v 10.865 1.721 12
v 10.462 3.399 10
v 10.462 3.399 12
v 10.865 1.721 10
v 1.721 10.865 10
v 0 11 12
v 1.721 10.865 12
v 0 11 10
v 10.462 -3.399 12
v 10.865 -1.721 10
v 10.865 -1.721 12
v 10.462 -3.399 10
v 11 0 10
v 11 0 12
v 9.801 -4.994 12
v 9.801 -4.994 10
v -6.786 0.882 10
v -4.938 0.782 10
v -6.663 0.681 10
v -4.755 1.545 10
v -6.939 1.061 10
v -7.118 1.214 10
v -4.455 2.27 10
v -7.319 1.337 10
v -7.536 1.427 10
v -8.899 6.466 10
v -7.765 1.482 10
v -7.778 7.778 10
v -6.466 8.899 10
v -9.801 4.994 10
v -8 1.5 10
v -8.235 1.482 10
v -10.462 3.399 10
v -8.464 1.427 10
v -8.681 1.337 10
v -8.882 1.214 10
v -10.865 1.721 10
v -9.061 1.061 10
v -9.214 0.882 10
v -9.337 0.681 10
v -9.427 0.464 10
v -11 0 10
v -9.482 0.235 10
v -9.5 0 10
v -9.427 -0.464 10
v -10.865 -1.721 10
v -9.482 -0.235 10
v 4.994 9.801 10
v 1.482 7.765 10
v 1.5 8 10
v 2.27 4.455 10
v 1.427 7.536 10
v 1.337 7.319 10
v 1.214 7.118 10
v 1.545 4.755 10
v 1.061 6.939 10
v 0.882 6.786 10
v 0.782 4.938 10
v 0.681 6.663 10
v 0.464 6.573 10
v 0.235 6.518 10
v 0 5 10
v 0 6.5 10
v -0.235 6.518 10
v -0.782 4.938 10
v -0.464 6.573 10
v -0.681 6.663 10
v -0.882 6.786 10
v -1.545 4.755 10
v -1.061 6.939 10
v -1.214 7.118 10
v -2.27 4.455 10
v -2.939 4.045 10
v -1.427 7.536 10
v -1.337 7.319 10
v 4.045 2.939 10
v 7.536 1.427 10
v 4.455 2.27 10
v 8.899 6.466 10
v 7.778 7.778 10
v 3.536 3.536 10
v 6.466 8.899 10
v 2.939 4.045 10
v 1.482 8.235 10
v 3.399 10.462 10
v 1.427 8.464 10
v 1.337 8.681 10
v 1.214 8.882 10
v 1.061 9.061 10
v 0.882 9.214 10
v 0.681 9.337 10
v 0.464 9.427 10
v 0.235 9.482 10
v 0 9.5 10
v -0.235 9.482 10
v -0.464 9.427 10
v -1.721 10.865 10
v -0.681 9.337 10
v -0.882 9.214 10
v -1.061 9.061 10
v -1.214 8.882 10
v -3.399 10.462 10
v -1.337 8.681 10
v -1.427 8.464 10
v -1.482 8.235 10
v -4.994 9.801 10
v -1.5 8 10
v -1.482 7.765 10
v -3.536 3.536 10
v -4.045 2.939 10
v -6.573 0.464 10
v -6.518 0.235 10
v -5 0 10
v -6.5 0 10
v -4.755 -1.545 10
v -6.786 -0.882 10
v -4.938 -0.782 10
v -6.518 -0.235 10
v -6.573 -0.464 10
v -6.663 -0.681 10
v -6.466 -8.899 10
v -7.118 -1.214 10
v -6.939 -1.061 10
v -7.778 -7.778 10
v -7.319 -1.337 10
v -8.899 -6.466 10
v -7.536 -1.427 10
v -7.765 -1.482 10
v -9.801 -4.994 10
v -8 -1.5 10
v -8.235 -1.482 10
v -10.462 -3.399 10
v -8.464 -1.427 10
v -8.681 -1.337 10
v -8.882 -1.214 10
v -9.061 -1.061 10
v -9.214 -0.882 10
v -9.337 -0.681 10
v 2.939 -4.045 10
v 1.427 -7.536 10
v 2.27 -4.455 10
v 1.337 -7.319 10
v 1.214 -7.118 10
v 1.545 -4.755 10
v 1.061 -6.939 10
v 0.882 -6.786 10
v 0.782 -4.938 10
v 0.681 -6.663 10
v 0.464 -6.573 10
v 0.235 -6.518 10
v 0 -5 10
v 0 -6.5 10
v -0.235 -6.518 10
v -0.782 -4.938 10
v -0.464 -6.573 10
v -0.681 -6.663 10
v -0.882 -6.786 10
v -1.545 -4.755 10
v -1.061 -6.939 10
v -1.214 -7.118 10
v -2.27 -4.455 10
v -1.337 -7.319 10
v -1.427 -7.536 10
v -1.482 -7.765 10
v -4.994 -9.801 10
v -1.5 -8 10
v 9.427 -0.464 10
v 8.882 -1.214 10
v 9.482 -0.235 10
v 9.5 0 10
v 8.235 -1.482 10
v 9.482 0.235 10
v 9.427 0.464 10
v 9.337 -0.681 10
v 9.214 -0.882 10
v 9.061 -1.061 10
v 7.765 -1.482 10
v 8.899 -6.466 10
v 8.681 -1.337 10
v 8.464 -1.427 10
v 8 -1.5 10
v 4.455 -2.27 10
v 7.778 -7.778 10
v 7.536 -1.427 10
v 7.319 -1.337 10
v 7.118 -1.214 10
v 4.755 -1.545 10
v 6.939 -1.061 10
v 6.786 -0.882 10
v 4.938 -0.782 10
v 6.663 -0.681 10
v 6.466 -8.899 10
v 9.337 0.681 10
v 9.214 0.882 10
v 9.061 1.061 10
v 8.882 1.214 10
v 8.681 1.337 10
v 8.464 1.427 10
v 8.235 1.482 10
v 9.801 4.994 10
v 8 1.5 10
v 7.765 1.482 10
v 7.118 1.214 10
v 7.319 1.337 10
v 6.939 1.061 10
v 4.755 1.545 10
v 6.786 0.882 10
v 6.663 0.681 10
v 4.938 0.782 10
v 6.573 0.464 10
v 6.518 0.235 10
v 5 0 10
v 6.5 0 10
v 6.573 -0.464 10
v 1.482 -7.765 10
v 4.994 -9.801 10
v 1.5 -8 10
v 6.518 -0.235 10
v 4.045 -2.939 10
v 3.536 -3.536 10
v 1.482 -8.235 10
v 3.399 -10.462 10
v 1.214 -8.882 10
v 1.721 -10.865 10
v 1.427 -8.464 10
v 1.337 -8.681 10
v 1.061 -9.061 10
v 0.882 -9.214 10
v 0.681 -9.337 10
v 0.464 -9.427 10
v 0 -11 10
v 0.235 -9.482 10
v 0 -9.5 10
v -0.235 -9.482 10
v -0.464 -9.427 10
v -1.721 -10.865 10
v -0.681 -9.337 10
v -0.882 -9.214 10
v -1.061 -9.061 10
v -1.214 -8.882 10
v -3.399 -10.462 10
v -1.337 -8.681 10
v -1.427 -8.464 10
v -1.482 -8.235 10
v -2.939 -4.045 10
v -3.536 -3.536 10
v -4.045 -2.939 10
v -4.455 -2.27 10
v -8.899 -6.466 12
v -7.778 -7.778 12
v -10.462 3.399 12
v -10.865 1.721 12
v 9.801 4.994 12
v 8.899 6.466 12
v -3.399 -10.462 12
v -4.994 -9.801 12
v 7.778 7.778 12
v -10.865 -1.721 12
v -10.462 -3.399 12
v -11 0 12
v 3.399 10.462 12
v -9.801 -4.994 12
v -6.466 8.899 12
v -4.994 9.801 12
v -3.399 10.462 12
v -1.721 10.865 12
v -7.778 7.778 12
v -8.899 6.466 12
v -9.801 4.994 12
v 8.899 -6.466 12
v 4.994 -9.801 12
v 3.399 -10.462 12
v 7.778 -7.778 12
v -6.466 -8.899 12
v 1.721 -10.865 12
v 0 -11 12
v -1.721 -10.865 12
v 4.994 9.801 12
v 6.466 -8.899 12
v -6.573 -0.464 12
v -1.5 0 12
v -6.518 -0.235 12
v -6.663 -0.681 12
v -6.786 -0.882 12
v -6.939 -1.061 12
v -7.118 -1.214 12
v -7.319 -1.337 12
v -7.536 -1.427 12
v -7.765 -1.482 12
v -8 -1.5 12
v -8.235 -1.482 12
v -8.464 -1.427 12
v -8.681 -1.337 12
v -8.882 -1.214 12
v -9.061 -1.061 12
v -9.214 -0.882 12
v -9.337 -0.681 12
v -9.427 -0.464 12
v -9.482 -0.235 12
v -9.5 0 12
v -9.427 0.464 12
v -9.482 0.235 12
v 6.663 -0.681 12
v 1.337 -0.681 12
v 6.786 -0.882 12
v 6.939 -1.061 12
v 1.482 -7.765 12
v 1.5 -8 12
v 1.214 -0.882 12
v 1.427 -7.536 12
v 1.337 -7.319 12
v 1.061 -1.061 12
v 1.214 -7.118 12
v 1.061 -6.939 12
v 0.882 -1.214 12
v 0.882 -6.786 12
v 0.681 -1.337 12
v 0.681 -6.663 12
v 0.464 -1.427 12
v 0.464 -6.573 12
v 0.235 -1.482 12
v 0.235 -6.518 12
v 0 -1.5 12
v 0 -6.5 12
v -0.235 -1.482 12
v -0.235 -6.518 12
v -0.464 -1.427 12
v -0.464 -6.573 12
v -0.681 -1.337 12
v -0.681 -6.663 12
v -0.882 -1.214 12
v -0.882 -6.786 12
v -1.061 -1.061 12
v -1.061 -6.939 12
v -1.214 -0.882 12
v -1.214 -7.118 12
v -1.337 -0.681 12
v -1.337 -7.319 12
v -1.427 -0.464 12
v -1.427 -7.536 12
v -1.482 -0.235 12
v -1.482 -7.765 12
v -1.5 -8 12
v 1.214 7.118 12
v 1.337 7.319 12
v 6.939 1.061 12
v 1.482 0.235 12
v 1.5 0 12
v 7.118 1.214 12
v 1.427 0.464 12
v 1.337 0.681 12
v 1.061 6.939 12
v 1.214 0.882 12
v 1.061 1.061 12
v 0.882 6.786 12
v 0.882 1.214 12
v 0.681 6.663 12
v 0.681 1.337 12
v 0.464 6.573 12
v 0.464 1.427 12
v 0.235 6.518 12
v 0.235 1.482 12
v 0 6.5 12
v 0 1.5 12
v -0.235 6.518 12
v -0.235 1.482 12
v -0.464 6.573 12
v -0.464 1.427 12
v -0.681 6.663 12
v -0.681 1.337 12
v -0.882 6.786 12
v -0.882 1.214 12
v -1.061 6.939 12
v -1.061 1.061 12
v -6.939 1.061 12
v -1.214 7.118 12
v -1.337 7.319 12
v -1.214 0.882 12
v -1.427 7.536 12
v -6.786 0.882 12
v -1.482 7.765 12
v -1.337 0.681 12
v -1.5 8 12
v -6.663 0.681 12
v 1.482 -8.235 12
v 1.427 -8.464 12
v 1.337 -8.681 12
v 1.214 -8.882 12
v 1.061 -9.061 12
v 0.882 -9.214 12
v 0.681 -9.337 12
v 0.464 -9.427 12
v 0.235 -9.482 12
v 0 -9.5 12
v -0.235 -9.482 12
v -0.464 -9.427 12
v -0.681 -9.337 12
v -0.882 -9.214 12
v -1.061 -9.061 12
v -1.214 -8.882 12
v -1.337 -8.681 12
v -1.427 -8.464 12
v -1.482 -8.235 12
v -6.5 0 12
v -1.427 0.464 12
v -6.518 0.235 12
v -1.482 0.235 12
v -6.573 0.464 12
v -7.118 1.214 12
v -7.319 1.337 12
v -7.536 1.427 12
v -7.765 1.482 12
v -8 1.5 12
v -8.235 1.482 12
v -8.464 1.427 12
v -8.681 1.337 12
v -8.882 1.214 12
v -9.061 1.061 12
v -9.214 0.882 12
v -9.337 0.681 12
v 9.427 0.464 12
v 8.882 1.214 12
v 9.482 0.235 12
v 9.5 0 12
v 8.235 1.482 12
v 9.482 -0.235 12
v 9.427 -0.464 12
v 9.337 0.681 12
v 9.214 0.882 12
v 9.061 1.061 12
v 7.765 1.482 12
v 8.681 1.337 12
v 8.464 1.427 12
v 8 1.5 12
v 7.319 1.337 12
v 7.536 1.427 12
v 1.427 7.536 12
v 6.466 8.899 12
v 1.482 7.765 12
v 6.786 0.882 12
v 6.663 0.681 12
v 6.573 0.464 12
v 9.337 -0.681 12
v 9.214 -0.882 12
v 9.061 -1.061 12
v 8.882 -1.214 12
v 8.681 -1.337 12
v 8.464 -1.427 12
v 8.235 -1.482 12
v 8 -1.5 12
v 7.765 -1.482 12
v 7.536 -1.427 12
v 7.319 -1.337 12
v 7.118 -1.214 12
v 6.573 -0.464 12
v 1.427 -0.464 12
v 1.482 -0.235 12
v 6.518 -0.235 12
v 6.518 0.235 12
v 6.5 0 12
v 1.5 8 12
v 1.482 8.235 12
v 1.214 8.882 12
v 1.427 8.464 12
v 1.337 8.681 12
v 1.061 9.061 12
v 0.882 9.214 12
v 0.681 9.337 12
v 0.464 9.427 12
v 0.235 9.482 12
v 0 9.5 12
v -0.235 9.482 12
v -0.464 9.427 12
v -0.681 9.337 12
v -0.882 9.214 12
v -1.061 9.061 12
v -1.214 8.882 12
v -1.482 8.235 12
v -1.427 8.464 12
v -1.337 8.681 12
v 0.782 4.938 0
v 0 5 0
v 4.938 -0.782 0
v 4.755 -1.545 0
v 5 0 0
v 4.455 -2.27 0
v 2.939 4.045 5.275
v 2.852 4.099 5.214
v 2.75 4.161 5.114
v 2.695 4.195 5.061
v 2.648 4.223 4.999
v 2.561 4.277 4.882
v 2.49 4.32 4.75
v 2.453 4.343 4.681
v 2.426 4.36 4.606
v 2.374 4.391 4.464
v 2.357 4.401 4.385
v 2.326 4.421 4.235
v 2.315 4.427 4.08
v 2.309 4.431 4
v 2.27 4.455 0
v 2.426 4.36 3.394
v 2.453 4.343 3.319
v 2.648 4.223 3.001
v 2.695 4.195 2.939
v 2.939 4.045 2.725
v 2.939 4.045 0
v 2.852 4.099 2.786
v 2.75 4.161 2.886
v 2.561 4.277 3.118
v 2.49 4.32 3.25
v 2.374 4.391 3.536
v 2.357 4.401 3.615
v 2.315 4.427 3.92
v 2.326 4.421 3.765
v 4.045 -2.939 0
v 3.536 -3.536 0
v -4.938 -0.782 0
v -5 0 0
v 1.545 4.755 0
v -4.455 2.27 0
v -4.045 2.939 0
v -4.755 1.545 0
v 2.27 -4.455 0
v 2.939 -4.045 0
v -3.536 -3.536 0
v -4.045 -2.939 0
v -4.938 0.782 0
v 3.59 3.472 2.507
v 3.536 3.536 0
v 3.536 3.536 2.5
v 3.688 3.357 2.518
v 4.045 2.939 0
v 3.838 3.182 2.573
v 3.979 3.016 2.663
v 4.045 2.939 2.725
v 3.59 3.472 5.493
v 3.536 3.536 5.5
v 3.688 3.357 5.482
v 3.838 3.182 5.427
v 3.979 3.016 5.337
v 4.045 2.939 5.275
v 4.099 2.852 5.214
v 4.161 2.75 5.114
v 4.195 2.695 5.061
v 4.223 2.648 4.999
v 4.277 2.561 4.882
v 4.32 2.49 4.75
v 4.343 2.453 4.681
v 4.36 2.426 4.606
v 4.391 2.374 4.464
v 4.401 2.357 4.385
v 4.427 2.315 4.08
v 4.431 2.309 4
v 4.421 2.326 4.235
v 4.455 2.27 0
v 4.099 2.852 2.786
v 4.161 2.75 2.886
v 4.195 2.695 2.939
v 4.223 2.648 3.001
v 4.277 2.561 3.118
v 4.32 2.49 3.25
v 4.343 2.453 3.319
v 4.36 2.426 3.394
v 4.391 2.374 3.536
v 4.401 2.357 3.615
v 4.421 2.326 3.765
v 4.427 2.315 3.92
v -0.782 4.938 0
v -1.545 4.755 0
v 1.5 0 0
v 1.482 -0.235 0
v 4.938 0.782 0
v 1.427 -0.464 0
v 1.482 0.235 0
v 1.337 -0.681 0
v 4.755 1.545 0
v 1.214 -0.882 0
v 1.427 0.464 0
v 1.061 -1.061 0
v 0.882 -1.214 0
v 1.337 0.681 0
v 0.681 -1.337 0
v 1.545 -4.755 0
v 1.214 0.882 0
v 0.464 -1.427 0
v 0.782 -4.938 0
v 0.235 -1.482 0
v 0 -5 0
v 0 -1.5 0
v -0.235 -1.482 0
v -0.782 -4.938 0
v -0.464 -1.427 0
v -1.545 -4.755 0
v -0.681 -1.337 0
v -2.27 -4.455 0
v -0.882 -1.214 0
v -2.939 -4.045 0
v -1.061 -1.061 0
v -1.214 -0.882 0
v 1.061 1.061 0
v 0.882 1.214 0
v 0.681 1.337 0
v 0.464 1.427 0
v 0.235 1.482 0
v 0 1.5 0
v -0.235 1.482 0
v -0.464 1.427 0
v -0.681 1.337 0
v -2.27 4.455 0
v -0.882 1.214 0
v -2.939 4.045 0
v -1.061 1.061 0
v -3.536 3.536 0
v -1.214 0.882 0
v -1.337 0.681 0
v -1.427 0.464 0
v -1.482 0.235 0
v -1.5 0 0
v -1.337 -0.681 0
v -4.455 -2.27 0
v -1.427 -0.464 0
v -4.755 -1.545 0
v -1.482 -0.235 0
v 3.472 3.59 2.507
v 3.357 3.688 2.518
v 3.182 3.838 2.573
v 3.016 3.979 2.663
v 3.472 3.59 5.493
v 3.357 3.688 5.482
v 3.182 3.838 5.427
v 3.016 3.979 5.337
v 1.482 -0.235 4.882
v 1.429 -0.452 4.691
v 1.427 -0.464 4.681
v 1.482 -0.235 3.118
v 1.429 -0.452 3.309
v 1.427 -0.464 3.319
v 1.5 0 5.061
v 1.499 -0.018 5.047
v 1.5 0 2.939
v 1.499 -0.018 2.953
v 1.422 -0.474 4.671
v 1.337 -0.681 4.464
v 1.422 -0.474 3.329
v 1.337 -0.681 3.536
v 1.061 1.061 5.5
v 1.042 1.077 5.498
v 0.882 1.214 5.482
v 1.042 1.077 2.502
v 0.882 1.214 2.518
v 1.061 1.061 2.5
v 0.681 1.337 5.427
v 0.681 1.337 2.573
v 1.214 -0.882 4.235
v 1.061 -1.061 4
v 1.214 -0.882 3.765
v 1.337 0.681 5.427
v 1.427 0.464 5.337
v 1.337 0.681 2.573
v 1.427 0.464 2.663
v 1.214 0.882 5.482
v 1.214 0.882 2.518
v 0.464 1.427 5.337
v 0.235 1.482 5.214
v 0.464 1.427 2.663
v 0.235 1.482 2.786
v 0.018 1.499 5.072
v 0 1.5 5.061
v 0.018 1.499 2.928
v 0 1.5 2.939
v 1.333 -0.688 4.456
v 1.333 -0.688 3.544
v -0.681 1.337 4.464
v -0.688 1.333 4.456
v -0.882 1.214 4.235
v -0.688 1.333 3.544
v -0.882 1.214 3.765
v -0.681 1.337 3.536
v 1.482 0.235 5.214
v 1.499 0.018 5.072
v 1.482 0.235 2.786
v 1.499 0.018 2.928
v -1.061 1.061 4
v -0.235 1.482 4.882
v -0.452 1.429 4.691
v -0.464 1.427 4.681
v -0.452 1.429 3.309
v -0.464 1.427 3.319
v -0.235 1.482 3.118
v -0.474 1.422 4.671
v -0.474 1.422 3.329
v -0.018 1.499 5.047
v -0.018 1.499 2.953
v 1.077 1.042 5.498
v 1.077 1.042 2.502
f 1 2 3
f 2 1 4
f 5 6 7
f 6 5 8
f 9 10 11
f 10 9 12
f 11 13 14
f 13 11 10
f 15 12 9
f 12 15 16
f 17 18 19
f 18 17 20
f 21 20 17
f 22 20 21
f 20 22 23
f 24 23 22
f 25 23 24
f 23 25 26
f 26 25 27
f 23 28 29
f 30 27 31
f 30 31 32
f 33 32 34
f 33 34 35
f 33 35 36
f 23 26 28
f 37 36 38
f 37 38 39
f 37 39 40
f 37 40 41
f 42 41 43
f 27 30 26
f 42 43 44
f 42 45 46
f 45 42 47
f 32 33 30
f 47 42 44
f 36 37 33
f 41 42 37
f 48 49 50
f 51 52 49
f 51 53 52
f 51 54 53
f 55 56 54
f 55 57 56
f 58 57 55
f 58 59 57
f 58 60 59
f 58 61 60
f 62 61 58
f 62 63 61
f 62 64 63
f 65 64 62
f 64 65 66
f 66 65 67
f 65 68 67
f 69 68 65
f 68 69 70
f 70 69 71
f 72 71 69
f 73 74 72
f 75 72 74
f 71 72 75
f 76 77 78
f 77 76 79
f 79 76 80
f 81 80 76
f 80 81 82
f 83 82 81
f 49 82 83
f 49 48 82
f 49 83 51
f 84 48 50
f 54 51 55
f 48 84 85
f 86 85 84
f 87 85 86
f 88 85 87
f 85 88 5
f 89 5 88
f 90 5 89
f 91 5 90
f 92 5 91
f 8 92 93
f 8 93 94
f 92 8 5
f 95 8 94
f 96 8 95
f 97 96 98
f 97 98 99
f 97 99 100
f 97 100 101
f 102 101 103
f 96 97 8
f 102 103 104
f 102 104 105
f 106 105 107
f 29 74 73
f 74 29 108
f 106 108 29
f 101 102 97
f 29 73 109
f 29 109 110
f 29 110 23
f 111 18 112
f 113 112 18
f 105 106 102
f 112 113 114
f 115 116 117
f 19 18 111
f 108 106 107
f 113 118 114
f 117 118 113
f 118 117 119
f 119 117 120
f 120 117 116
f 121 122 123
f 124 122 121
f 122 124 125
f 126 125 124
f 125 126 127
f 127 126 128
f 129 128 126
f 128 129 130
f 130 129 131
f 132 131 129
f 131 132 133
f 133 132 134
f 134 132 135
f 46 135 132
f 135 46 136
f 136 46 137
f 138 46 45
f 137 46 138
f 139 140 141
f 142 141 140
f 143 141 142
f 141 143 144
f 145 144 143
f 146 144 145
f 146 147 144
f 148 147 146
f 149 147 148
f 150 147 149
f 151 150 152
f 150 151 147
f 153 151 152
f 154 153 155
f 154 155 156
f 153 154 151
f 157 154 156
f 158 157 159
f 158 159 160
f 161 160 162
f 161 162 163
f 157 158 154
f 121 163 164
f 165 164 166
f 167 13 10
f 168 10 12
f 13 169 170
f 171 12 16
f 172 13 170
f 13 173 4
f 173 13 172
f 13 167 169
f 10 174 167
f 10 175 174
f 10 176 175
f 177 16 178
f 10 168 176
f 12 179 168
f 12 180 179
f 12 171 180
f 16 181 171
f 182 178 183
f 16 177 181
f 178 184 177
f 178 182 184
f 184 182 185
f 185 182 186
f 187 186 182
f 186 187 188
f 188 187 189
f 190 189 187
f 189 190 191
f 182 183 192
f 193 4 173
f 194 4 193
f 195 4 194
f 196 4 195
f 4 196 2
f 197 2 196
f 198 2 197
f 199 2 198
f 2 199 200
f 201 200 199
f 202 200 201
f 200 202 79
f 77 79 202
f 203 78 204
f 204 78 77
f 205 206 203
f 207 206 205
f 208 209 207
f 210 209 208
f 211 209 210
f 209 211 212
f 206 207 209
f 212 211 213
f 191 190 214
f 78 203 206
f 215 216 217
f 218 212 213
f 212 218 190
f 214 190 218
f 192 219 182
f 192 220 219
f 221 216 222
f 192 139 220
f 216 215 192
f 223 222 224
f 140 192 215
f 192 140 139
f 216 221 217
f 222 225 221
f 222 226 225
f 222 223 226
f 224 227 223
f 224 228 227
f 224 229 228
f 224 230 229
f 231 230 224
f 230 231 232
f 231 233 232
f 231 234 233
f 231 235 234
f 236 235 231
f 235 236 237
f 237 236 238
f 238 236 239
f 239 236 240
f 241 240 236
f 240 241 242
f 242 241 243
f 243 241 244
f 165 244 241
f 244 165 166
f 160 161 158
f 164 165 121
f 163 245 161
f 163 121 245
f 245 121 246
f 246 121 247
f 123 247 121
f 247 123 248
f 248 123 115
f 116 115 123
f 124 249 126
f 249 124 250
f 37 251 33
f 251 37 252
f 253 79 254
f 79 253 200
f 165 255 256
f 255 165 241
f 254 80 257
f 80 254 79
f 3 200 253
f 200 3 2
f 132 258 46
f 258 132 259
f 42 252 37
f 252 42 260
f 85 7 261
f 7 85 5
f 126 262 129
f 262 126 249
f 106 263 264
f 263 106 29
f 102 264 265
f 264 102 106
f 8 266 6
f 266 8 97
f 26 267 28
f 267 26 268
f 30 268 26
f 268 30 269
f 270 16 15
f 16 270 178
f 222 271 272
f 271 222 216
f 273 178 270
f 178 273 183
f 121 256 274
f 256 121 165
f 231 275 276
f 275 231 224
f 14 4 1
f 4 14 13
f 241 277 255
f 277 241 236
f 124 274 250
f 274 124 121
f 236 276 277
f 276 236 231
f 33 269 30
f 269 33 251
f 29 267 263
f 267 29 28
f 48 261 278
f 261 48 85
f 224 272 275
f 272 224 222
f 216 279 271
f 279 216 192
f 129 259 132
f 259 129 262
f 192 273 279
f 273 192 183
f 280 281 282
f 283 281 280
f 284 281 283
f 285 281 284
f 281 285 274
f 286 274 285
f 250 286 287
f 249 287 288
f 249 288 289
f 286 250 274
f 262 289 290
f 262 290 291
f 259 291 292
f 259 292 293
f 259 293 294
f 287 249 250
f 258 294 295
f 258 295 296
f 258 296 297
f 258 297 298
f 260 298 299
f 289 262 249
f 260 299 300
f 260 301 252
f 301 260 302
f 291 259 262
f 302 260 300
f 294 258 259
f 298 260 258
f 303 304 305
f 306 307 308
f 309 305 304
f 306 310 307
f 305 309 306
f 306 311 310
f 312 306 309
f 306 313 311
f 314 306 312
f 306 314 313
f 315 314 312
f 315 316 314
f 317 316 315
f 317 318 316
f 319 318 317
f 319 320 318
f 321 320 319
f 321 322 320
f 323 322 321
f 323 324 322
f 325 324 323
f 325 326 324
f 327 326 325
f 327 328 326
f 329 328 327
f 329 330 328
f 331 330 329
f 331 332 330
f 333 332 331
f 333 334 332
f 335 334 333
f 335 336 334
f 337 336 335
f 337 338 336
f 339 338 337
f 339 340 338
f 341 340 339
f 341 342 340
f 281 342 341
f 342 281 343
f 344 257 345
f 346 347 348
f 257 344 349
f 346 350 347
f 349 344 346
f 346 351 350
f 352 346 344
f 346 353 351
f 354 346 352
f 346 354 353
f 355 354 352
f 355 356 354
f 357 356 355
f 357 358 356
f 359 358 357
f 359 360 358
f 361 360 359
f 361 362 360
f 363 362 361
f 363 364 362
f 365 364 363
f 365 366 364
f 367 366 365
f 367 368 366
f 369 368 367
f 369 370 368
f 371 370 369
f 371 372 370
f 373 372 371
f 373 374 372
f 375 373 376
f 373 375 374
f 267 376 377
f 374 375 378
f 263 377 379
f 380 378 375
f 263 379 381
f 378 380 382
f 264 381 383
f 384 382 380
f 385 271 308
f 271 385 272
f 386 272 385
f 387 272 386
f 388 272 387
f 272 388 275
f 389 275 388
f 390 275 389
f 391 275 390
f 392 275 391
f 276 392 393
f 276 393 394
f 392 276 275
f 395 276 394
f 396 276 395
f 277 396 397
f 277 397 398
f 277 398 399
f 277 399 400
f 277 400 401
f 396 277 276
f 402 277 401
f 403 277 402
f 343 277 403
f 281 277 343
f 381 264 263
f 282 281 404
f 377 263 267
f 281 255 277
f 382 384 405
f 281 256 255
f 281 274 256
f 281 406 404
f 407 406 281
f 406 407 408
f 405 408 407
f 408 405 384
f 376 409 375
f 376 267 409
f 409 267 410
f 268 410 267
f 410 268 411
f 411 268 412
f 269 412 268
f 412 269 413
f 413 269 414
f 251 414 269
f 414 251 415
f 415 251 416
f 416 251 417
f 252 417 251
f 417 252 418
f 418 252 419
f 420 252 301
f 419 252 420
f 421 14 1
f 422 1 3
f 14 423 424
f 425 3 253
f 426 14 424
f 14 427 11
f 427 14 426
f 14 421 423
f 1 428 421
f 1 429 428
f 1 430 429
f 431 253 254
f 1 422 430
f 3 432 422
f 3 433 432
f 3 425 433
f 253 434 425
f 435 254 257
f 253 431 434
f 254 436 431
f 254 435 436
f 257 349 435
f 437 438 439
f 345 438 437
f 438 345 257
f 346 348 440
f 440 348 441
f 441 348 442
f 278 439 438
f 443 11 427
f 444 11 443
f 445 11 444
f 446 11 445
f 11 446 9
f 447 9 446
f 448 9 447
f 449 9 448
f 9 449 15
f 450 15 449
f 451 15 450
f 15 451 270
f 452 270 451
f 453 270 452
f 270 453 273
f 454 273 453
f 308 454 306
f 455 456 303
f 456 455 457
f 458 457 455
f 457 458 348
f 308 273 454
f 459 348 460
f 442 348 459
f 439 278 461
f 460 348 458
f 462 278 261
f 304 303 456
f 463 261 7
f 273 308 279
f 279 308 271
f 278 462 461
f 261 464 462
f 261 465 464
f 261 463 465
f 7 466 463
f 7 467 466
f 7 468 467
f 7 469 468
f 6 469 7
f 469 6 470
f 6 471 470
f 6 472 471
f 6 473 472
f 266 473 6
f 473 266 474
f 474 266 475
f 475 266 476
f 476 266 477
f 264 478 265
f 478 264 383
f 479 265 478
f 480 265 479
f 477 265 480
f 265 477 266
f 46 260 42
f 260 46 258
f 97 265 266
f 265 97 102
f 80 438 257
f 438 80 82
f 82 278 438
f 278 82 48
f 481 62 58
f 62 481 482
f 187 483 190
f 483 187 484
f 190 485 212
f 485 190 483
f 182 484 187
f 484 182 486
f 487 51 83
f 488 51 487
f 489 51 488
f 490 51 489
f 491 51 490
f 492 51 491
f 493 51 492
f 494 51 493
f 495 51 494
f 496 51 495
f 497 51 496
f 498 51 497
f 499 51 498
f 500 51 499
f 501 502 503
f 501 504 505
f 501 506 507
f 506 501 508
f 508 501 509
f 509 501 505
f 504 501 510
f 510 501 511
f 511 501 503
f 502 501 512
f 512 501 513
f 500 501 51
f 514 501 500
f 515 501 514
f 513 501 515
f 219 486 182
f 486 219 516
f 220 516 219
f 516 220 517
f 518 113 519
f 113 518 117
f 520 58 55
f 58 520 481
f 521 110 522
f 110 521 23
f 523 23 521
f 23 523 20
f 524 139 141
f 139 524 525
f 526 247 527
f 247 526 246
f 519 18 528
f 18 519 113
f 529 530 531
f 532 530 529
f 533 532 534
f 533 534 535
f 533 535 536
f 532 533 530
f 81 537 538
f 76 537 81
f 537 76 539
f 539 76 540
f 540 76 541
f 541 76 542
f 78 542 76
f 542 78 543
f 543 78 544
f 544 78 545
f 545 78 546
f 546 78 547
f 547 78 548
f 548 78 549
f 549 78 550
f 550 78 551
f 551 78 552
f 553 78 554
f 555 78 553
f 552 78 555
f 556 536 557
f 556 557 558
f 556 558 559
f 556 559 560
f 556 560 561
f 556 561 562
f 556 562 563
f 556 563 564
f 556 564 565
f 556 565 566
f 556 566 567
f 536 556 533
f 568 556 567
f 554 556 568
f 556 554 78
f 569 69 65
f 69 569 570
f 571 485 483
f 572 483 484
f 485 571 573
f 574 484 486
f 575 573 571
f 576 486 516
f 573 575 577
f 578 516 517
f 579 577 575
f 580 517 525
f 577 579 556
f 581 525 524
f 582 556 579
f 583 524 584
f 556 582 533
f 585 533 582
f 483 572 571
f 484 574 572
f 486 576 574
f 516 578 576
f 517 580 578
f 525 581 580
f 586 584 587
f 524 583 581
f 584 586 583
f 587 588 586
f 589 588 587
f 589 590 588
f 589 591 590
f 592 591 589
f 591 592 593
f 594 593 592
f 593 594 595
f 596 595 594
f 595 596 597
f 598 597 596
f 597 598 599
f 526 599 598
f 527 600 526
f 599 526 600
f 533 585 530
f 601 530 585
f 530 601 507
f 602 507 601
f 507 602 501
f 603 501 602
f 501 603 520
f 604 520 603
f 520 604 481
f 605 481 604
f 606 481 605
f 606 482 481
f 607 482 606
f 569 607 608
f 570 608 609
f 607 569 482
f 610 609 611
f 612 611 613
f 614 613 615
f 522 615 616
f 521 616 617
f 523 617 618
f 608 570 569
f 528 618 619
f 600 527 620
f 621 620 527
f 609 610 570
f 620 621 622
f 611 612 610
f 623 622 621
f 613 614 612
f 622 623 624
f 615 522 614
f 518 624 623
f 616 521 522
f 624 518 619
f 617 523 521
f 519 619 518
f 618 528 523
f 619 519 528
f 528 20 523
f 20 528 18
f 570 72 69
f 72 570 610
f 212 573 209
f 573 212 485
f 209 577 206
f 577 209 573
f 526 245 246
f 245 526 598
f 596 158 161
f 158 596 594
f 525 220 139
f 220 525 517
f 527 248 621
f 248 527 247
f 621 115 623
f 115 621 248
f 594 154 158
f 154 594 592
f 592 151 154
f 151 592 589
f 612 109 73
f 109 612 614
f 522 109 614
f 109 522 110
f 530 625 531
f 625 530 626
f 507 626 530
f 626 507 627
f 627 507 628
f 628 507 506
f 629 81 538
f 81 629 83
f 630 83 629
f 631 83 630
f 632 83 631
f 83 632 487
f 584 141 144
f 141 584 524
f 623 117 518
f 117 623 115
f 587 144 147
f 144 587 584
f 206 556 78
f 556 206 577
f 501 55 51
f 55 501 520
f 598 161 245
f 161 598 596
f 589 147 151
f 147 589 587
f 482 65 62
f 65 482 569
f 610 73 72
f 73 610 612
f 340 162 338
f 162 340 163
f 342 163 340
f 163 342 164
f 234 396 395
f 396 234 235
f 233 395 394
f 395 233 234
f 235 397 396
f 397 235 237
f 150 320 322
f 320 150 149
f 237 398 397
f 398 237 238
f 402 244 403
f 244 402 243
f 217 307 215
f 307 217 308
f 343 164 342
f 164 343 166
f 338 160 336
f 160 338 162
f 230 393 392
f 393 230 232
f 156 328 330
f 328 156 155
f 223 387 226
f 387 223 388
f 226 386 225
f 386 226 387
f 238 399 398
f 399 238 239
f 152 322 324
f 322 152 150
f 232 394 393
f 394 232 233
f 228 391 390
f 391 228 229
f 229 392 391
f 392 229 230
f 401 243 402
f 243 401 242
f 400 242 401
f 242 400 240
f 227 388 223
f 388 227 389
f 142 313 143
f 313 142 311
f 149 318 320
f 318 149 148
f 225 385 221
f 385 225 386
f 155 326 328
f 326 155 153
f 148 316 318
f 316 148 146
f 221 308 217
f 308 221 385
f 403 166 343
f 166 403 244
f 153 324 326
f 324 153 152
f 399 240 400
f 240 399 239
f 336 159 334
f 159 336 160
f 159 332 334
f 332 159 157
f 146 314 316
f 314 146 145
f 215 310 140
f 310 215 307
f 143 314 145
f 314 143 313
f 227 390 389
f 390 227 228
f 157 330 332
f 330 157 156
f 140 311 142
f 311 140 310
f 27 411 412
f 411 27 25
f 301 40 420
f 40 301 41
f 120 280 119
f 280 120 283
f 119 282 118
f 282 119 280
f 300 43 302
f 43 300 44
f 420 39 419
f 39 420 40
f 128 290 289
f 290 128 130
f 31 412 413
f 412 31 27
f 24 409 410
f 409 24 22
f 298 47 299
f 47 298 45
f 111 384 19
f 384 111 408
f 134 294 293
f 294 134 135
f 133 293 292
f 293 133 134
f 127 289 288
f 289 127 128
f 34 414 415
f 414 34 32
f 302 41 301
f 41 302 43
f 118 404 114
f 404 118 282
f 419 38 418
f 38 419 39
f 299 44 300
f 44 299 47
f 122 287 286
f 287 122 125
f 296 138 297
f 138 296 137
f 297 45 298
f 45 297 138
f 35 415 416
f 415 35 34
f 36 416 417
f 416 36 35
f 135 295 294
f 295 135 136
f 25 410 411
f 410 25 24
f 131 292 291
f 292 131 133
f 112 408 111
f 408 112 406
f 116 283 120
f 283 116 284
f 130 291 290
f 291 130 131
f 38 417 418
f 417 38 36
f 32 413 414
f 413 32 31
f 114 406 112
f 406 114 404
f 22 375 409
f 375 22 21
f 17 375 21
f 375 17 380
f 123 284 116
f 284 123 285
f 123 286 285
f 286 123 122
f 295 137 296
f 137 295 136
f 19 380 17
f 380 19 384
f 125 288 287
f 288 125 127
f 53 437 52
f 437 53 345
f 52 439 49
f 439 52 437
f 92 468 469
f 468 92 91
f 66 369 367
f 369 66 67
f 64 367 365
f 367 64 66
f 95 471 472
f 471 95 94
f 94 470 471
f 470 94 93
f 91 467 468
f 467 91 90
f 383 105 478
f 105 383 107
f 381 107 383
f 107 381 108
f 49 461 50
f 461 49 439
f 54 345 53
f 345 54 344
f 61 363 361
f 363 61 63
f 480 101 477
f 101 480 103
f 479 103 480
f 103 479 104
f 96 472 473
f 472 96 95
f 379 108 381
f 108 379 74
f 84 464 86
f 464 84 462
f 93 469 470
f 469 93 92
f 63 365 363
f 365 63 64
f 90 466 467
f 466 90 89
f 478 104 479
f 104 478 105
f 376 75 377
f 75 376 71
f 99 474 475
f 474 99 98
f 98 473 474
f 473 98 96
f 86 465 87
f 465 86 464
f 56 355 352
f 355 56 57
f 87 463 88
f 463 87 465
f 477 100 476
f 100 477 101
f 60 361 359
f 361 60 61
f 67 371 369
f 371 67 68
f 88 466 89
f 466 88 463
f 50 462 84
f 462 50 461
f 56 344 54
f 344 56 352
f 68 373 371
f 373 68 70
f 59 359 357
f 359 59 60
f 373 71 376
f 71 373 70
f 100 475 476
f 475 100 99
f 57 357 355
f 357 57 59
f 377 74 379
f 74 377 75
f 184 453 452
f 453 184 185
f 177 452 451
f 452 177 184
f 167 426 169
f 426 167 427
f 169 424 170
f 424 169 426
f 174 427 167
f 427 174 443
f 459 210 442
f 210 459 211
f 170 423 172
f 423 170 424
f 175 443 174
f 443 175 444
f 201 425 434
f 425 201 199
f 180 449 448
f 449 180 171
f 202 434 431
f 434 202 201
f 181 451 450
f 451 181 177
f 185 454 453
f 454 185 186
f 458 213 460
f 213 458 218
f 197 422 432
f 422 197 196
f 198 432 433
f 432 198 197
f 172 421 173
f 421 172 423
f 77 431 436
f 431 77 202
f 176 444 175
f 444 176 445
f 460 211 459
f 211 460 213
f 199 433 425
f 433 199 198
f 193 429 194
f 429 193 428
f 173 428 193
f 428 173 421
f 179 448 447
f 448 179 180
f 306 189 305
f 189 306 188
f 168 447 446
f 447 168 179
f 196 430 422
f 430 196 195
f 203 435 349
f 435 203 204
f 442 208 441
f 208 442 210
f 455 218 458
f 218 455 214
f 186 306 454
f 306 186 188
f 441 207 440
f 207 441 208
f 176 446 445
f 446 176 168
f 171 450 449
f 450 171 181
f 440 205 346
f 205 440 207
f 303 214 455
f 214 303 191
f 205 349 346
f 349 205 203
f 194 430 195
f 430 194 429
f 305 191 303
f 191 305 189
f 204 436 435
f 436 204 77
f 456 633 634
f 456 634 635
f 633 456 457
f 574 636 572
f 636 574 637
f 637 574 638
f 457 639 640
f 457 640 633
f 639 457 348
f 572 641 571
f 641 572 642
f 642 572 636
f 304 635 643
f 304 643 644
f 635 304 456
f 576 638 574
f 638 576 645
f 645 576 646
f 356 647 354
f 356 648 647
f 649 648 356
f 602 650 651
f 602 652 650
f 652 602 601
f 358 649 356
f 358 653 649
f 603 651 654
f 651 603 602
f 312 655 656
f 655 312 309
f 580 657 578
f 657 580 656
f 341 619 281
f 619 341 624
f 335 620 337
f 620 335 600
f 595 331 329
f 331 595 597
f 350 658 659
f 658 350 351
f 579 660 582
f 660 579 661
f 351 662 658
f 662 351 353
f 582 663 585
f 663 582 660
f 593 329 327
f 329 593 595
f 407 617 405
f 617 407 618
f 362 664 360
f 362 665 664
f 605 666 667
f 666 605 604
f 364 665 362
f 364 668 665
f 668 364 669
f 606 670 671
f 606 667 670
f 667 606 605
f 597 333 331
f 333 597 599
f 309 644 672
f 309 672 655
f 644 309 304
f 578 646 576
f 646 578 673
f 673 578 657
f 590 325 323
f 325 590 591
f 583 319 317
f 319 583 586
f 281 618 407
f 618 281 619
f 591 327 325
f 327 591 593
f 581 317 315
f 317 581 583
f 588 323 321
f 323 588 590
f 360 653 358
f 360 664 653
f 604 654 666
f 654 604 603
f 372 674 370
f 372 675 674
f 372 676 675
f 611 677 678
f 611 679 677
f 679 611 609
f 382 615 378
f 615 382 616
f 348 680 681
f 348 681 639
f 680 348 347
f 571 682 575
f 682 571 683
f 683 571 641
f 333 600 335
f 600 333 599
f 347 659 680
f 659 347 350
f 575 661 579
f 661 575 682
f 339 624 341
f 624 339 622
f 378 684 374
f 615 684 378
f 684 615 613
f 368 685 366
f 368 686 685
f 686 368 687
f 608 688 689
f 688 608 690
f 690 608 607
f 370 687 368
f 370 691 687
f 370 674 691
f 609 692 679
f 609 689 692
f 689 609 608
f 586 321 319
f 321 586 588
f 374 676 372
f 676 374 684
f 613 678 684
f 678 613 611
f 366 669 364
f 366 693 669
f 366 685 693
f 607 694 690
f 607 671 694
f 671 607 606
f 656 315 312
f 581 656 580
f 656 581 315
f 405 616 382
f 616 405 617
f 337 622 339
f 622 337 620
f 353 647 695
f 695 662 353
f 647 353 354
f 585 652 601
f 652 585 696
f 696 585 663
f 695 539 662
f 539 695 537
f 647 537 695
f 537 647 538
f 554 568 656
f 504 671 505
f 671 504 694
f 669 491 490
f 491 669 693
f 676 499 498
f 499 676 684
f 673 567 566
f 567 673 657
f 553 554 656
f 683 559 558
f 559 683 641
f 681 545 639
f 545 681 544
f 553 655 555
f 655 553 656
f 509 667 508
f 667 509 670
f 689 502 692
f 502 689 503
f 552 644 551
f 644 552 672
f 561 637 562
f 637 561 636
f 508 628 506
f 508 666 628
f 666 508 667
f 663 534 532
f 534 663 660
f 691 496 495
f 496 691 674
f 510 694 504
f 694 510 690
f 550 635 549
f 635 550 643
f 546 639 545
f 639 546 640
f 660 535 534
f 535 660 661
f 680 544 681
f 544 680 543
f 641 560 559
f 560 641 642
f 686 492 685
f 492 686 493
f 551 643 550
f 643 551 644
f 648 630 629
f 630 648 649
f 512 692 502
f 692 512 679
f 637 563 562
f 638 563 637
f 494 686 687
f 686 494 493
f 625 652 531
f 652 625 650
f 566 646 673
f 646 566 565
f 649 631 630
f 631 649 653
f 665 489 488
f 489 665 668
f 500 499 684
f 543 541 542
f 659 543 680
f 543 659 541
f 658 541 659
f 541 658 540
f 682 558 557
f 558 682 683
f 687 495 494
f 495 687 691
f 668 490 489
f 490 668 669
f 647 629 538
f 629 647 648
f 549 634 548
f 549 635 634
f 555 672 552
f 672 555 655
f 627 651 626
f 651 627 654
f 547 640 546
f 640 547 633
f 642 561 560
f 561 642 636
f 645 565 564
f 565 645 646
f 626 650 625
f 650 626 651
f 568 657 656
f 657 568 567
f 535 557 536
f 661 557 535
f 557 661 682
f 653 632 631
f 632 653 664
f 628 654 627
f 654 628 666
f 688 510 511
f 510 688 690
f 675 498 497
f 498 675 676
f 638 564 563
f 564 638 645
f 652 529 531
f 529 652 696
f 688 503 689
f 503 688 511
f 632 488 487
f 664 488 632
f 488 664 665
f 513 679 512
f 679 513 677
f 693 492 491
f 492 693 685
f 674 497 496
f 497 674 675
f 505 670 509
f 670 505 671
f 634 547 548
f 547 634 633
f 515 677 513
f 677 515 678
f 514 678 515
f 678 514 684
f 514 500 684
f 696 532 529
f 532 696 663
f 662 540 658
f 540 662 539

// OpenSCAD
$fn=40;

flange_d = 22;
collar_d = 10;
hole_d = 3;

hole_w = 11.3;
collar_h = 12;
flange_h = 2;

hole_r = 8;

module m3_flange(){
  translate([0,0,collar_h])
  rotate([180, 0, 0])
  color("silver")
  difference(){
    union(){
      cylinder(d=flange_d, h=flange_h);
      cylinder(d=collar_d, h=collar_h);
    }
    translate([0,0,-1])cylinder(d=hole_d, h=collar_h + 2);
    for(i=[1:4]){
      rotate([0, 0, 90 * i])translate([hole_r, 0, -1])cylinder(d=hole_d, h=collar_h + 2);
    }
    rotate([0,0,-45])translate([0, 0, 8])rotate([0, 90, 0])cylinder(d=hole_d, h=collar_h + 2);
  }
}

m3_flange();
